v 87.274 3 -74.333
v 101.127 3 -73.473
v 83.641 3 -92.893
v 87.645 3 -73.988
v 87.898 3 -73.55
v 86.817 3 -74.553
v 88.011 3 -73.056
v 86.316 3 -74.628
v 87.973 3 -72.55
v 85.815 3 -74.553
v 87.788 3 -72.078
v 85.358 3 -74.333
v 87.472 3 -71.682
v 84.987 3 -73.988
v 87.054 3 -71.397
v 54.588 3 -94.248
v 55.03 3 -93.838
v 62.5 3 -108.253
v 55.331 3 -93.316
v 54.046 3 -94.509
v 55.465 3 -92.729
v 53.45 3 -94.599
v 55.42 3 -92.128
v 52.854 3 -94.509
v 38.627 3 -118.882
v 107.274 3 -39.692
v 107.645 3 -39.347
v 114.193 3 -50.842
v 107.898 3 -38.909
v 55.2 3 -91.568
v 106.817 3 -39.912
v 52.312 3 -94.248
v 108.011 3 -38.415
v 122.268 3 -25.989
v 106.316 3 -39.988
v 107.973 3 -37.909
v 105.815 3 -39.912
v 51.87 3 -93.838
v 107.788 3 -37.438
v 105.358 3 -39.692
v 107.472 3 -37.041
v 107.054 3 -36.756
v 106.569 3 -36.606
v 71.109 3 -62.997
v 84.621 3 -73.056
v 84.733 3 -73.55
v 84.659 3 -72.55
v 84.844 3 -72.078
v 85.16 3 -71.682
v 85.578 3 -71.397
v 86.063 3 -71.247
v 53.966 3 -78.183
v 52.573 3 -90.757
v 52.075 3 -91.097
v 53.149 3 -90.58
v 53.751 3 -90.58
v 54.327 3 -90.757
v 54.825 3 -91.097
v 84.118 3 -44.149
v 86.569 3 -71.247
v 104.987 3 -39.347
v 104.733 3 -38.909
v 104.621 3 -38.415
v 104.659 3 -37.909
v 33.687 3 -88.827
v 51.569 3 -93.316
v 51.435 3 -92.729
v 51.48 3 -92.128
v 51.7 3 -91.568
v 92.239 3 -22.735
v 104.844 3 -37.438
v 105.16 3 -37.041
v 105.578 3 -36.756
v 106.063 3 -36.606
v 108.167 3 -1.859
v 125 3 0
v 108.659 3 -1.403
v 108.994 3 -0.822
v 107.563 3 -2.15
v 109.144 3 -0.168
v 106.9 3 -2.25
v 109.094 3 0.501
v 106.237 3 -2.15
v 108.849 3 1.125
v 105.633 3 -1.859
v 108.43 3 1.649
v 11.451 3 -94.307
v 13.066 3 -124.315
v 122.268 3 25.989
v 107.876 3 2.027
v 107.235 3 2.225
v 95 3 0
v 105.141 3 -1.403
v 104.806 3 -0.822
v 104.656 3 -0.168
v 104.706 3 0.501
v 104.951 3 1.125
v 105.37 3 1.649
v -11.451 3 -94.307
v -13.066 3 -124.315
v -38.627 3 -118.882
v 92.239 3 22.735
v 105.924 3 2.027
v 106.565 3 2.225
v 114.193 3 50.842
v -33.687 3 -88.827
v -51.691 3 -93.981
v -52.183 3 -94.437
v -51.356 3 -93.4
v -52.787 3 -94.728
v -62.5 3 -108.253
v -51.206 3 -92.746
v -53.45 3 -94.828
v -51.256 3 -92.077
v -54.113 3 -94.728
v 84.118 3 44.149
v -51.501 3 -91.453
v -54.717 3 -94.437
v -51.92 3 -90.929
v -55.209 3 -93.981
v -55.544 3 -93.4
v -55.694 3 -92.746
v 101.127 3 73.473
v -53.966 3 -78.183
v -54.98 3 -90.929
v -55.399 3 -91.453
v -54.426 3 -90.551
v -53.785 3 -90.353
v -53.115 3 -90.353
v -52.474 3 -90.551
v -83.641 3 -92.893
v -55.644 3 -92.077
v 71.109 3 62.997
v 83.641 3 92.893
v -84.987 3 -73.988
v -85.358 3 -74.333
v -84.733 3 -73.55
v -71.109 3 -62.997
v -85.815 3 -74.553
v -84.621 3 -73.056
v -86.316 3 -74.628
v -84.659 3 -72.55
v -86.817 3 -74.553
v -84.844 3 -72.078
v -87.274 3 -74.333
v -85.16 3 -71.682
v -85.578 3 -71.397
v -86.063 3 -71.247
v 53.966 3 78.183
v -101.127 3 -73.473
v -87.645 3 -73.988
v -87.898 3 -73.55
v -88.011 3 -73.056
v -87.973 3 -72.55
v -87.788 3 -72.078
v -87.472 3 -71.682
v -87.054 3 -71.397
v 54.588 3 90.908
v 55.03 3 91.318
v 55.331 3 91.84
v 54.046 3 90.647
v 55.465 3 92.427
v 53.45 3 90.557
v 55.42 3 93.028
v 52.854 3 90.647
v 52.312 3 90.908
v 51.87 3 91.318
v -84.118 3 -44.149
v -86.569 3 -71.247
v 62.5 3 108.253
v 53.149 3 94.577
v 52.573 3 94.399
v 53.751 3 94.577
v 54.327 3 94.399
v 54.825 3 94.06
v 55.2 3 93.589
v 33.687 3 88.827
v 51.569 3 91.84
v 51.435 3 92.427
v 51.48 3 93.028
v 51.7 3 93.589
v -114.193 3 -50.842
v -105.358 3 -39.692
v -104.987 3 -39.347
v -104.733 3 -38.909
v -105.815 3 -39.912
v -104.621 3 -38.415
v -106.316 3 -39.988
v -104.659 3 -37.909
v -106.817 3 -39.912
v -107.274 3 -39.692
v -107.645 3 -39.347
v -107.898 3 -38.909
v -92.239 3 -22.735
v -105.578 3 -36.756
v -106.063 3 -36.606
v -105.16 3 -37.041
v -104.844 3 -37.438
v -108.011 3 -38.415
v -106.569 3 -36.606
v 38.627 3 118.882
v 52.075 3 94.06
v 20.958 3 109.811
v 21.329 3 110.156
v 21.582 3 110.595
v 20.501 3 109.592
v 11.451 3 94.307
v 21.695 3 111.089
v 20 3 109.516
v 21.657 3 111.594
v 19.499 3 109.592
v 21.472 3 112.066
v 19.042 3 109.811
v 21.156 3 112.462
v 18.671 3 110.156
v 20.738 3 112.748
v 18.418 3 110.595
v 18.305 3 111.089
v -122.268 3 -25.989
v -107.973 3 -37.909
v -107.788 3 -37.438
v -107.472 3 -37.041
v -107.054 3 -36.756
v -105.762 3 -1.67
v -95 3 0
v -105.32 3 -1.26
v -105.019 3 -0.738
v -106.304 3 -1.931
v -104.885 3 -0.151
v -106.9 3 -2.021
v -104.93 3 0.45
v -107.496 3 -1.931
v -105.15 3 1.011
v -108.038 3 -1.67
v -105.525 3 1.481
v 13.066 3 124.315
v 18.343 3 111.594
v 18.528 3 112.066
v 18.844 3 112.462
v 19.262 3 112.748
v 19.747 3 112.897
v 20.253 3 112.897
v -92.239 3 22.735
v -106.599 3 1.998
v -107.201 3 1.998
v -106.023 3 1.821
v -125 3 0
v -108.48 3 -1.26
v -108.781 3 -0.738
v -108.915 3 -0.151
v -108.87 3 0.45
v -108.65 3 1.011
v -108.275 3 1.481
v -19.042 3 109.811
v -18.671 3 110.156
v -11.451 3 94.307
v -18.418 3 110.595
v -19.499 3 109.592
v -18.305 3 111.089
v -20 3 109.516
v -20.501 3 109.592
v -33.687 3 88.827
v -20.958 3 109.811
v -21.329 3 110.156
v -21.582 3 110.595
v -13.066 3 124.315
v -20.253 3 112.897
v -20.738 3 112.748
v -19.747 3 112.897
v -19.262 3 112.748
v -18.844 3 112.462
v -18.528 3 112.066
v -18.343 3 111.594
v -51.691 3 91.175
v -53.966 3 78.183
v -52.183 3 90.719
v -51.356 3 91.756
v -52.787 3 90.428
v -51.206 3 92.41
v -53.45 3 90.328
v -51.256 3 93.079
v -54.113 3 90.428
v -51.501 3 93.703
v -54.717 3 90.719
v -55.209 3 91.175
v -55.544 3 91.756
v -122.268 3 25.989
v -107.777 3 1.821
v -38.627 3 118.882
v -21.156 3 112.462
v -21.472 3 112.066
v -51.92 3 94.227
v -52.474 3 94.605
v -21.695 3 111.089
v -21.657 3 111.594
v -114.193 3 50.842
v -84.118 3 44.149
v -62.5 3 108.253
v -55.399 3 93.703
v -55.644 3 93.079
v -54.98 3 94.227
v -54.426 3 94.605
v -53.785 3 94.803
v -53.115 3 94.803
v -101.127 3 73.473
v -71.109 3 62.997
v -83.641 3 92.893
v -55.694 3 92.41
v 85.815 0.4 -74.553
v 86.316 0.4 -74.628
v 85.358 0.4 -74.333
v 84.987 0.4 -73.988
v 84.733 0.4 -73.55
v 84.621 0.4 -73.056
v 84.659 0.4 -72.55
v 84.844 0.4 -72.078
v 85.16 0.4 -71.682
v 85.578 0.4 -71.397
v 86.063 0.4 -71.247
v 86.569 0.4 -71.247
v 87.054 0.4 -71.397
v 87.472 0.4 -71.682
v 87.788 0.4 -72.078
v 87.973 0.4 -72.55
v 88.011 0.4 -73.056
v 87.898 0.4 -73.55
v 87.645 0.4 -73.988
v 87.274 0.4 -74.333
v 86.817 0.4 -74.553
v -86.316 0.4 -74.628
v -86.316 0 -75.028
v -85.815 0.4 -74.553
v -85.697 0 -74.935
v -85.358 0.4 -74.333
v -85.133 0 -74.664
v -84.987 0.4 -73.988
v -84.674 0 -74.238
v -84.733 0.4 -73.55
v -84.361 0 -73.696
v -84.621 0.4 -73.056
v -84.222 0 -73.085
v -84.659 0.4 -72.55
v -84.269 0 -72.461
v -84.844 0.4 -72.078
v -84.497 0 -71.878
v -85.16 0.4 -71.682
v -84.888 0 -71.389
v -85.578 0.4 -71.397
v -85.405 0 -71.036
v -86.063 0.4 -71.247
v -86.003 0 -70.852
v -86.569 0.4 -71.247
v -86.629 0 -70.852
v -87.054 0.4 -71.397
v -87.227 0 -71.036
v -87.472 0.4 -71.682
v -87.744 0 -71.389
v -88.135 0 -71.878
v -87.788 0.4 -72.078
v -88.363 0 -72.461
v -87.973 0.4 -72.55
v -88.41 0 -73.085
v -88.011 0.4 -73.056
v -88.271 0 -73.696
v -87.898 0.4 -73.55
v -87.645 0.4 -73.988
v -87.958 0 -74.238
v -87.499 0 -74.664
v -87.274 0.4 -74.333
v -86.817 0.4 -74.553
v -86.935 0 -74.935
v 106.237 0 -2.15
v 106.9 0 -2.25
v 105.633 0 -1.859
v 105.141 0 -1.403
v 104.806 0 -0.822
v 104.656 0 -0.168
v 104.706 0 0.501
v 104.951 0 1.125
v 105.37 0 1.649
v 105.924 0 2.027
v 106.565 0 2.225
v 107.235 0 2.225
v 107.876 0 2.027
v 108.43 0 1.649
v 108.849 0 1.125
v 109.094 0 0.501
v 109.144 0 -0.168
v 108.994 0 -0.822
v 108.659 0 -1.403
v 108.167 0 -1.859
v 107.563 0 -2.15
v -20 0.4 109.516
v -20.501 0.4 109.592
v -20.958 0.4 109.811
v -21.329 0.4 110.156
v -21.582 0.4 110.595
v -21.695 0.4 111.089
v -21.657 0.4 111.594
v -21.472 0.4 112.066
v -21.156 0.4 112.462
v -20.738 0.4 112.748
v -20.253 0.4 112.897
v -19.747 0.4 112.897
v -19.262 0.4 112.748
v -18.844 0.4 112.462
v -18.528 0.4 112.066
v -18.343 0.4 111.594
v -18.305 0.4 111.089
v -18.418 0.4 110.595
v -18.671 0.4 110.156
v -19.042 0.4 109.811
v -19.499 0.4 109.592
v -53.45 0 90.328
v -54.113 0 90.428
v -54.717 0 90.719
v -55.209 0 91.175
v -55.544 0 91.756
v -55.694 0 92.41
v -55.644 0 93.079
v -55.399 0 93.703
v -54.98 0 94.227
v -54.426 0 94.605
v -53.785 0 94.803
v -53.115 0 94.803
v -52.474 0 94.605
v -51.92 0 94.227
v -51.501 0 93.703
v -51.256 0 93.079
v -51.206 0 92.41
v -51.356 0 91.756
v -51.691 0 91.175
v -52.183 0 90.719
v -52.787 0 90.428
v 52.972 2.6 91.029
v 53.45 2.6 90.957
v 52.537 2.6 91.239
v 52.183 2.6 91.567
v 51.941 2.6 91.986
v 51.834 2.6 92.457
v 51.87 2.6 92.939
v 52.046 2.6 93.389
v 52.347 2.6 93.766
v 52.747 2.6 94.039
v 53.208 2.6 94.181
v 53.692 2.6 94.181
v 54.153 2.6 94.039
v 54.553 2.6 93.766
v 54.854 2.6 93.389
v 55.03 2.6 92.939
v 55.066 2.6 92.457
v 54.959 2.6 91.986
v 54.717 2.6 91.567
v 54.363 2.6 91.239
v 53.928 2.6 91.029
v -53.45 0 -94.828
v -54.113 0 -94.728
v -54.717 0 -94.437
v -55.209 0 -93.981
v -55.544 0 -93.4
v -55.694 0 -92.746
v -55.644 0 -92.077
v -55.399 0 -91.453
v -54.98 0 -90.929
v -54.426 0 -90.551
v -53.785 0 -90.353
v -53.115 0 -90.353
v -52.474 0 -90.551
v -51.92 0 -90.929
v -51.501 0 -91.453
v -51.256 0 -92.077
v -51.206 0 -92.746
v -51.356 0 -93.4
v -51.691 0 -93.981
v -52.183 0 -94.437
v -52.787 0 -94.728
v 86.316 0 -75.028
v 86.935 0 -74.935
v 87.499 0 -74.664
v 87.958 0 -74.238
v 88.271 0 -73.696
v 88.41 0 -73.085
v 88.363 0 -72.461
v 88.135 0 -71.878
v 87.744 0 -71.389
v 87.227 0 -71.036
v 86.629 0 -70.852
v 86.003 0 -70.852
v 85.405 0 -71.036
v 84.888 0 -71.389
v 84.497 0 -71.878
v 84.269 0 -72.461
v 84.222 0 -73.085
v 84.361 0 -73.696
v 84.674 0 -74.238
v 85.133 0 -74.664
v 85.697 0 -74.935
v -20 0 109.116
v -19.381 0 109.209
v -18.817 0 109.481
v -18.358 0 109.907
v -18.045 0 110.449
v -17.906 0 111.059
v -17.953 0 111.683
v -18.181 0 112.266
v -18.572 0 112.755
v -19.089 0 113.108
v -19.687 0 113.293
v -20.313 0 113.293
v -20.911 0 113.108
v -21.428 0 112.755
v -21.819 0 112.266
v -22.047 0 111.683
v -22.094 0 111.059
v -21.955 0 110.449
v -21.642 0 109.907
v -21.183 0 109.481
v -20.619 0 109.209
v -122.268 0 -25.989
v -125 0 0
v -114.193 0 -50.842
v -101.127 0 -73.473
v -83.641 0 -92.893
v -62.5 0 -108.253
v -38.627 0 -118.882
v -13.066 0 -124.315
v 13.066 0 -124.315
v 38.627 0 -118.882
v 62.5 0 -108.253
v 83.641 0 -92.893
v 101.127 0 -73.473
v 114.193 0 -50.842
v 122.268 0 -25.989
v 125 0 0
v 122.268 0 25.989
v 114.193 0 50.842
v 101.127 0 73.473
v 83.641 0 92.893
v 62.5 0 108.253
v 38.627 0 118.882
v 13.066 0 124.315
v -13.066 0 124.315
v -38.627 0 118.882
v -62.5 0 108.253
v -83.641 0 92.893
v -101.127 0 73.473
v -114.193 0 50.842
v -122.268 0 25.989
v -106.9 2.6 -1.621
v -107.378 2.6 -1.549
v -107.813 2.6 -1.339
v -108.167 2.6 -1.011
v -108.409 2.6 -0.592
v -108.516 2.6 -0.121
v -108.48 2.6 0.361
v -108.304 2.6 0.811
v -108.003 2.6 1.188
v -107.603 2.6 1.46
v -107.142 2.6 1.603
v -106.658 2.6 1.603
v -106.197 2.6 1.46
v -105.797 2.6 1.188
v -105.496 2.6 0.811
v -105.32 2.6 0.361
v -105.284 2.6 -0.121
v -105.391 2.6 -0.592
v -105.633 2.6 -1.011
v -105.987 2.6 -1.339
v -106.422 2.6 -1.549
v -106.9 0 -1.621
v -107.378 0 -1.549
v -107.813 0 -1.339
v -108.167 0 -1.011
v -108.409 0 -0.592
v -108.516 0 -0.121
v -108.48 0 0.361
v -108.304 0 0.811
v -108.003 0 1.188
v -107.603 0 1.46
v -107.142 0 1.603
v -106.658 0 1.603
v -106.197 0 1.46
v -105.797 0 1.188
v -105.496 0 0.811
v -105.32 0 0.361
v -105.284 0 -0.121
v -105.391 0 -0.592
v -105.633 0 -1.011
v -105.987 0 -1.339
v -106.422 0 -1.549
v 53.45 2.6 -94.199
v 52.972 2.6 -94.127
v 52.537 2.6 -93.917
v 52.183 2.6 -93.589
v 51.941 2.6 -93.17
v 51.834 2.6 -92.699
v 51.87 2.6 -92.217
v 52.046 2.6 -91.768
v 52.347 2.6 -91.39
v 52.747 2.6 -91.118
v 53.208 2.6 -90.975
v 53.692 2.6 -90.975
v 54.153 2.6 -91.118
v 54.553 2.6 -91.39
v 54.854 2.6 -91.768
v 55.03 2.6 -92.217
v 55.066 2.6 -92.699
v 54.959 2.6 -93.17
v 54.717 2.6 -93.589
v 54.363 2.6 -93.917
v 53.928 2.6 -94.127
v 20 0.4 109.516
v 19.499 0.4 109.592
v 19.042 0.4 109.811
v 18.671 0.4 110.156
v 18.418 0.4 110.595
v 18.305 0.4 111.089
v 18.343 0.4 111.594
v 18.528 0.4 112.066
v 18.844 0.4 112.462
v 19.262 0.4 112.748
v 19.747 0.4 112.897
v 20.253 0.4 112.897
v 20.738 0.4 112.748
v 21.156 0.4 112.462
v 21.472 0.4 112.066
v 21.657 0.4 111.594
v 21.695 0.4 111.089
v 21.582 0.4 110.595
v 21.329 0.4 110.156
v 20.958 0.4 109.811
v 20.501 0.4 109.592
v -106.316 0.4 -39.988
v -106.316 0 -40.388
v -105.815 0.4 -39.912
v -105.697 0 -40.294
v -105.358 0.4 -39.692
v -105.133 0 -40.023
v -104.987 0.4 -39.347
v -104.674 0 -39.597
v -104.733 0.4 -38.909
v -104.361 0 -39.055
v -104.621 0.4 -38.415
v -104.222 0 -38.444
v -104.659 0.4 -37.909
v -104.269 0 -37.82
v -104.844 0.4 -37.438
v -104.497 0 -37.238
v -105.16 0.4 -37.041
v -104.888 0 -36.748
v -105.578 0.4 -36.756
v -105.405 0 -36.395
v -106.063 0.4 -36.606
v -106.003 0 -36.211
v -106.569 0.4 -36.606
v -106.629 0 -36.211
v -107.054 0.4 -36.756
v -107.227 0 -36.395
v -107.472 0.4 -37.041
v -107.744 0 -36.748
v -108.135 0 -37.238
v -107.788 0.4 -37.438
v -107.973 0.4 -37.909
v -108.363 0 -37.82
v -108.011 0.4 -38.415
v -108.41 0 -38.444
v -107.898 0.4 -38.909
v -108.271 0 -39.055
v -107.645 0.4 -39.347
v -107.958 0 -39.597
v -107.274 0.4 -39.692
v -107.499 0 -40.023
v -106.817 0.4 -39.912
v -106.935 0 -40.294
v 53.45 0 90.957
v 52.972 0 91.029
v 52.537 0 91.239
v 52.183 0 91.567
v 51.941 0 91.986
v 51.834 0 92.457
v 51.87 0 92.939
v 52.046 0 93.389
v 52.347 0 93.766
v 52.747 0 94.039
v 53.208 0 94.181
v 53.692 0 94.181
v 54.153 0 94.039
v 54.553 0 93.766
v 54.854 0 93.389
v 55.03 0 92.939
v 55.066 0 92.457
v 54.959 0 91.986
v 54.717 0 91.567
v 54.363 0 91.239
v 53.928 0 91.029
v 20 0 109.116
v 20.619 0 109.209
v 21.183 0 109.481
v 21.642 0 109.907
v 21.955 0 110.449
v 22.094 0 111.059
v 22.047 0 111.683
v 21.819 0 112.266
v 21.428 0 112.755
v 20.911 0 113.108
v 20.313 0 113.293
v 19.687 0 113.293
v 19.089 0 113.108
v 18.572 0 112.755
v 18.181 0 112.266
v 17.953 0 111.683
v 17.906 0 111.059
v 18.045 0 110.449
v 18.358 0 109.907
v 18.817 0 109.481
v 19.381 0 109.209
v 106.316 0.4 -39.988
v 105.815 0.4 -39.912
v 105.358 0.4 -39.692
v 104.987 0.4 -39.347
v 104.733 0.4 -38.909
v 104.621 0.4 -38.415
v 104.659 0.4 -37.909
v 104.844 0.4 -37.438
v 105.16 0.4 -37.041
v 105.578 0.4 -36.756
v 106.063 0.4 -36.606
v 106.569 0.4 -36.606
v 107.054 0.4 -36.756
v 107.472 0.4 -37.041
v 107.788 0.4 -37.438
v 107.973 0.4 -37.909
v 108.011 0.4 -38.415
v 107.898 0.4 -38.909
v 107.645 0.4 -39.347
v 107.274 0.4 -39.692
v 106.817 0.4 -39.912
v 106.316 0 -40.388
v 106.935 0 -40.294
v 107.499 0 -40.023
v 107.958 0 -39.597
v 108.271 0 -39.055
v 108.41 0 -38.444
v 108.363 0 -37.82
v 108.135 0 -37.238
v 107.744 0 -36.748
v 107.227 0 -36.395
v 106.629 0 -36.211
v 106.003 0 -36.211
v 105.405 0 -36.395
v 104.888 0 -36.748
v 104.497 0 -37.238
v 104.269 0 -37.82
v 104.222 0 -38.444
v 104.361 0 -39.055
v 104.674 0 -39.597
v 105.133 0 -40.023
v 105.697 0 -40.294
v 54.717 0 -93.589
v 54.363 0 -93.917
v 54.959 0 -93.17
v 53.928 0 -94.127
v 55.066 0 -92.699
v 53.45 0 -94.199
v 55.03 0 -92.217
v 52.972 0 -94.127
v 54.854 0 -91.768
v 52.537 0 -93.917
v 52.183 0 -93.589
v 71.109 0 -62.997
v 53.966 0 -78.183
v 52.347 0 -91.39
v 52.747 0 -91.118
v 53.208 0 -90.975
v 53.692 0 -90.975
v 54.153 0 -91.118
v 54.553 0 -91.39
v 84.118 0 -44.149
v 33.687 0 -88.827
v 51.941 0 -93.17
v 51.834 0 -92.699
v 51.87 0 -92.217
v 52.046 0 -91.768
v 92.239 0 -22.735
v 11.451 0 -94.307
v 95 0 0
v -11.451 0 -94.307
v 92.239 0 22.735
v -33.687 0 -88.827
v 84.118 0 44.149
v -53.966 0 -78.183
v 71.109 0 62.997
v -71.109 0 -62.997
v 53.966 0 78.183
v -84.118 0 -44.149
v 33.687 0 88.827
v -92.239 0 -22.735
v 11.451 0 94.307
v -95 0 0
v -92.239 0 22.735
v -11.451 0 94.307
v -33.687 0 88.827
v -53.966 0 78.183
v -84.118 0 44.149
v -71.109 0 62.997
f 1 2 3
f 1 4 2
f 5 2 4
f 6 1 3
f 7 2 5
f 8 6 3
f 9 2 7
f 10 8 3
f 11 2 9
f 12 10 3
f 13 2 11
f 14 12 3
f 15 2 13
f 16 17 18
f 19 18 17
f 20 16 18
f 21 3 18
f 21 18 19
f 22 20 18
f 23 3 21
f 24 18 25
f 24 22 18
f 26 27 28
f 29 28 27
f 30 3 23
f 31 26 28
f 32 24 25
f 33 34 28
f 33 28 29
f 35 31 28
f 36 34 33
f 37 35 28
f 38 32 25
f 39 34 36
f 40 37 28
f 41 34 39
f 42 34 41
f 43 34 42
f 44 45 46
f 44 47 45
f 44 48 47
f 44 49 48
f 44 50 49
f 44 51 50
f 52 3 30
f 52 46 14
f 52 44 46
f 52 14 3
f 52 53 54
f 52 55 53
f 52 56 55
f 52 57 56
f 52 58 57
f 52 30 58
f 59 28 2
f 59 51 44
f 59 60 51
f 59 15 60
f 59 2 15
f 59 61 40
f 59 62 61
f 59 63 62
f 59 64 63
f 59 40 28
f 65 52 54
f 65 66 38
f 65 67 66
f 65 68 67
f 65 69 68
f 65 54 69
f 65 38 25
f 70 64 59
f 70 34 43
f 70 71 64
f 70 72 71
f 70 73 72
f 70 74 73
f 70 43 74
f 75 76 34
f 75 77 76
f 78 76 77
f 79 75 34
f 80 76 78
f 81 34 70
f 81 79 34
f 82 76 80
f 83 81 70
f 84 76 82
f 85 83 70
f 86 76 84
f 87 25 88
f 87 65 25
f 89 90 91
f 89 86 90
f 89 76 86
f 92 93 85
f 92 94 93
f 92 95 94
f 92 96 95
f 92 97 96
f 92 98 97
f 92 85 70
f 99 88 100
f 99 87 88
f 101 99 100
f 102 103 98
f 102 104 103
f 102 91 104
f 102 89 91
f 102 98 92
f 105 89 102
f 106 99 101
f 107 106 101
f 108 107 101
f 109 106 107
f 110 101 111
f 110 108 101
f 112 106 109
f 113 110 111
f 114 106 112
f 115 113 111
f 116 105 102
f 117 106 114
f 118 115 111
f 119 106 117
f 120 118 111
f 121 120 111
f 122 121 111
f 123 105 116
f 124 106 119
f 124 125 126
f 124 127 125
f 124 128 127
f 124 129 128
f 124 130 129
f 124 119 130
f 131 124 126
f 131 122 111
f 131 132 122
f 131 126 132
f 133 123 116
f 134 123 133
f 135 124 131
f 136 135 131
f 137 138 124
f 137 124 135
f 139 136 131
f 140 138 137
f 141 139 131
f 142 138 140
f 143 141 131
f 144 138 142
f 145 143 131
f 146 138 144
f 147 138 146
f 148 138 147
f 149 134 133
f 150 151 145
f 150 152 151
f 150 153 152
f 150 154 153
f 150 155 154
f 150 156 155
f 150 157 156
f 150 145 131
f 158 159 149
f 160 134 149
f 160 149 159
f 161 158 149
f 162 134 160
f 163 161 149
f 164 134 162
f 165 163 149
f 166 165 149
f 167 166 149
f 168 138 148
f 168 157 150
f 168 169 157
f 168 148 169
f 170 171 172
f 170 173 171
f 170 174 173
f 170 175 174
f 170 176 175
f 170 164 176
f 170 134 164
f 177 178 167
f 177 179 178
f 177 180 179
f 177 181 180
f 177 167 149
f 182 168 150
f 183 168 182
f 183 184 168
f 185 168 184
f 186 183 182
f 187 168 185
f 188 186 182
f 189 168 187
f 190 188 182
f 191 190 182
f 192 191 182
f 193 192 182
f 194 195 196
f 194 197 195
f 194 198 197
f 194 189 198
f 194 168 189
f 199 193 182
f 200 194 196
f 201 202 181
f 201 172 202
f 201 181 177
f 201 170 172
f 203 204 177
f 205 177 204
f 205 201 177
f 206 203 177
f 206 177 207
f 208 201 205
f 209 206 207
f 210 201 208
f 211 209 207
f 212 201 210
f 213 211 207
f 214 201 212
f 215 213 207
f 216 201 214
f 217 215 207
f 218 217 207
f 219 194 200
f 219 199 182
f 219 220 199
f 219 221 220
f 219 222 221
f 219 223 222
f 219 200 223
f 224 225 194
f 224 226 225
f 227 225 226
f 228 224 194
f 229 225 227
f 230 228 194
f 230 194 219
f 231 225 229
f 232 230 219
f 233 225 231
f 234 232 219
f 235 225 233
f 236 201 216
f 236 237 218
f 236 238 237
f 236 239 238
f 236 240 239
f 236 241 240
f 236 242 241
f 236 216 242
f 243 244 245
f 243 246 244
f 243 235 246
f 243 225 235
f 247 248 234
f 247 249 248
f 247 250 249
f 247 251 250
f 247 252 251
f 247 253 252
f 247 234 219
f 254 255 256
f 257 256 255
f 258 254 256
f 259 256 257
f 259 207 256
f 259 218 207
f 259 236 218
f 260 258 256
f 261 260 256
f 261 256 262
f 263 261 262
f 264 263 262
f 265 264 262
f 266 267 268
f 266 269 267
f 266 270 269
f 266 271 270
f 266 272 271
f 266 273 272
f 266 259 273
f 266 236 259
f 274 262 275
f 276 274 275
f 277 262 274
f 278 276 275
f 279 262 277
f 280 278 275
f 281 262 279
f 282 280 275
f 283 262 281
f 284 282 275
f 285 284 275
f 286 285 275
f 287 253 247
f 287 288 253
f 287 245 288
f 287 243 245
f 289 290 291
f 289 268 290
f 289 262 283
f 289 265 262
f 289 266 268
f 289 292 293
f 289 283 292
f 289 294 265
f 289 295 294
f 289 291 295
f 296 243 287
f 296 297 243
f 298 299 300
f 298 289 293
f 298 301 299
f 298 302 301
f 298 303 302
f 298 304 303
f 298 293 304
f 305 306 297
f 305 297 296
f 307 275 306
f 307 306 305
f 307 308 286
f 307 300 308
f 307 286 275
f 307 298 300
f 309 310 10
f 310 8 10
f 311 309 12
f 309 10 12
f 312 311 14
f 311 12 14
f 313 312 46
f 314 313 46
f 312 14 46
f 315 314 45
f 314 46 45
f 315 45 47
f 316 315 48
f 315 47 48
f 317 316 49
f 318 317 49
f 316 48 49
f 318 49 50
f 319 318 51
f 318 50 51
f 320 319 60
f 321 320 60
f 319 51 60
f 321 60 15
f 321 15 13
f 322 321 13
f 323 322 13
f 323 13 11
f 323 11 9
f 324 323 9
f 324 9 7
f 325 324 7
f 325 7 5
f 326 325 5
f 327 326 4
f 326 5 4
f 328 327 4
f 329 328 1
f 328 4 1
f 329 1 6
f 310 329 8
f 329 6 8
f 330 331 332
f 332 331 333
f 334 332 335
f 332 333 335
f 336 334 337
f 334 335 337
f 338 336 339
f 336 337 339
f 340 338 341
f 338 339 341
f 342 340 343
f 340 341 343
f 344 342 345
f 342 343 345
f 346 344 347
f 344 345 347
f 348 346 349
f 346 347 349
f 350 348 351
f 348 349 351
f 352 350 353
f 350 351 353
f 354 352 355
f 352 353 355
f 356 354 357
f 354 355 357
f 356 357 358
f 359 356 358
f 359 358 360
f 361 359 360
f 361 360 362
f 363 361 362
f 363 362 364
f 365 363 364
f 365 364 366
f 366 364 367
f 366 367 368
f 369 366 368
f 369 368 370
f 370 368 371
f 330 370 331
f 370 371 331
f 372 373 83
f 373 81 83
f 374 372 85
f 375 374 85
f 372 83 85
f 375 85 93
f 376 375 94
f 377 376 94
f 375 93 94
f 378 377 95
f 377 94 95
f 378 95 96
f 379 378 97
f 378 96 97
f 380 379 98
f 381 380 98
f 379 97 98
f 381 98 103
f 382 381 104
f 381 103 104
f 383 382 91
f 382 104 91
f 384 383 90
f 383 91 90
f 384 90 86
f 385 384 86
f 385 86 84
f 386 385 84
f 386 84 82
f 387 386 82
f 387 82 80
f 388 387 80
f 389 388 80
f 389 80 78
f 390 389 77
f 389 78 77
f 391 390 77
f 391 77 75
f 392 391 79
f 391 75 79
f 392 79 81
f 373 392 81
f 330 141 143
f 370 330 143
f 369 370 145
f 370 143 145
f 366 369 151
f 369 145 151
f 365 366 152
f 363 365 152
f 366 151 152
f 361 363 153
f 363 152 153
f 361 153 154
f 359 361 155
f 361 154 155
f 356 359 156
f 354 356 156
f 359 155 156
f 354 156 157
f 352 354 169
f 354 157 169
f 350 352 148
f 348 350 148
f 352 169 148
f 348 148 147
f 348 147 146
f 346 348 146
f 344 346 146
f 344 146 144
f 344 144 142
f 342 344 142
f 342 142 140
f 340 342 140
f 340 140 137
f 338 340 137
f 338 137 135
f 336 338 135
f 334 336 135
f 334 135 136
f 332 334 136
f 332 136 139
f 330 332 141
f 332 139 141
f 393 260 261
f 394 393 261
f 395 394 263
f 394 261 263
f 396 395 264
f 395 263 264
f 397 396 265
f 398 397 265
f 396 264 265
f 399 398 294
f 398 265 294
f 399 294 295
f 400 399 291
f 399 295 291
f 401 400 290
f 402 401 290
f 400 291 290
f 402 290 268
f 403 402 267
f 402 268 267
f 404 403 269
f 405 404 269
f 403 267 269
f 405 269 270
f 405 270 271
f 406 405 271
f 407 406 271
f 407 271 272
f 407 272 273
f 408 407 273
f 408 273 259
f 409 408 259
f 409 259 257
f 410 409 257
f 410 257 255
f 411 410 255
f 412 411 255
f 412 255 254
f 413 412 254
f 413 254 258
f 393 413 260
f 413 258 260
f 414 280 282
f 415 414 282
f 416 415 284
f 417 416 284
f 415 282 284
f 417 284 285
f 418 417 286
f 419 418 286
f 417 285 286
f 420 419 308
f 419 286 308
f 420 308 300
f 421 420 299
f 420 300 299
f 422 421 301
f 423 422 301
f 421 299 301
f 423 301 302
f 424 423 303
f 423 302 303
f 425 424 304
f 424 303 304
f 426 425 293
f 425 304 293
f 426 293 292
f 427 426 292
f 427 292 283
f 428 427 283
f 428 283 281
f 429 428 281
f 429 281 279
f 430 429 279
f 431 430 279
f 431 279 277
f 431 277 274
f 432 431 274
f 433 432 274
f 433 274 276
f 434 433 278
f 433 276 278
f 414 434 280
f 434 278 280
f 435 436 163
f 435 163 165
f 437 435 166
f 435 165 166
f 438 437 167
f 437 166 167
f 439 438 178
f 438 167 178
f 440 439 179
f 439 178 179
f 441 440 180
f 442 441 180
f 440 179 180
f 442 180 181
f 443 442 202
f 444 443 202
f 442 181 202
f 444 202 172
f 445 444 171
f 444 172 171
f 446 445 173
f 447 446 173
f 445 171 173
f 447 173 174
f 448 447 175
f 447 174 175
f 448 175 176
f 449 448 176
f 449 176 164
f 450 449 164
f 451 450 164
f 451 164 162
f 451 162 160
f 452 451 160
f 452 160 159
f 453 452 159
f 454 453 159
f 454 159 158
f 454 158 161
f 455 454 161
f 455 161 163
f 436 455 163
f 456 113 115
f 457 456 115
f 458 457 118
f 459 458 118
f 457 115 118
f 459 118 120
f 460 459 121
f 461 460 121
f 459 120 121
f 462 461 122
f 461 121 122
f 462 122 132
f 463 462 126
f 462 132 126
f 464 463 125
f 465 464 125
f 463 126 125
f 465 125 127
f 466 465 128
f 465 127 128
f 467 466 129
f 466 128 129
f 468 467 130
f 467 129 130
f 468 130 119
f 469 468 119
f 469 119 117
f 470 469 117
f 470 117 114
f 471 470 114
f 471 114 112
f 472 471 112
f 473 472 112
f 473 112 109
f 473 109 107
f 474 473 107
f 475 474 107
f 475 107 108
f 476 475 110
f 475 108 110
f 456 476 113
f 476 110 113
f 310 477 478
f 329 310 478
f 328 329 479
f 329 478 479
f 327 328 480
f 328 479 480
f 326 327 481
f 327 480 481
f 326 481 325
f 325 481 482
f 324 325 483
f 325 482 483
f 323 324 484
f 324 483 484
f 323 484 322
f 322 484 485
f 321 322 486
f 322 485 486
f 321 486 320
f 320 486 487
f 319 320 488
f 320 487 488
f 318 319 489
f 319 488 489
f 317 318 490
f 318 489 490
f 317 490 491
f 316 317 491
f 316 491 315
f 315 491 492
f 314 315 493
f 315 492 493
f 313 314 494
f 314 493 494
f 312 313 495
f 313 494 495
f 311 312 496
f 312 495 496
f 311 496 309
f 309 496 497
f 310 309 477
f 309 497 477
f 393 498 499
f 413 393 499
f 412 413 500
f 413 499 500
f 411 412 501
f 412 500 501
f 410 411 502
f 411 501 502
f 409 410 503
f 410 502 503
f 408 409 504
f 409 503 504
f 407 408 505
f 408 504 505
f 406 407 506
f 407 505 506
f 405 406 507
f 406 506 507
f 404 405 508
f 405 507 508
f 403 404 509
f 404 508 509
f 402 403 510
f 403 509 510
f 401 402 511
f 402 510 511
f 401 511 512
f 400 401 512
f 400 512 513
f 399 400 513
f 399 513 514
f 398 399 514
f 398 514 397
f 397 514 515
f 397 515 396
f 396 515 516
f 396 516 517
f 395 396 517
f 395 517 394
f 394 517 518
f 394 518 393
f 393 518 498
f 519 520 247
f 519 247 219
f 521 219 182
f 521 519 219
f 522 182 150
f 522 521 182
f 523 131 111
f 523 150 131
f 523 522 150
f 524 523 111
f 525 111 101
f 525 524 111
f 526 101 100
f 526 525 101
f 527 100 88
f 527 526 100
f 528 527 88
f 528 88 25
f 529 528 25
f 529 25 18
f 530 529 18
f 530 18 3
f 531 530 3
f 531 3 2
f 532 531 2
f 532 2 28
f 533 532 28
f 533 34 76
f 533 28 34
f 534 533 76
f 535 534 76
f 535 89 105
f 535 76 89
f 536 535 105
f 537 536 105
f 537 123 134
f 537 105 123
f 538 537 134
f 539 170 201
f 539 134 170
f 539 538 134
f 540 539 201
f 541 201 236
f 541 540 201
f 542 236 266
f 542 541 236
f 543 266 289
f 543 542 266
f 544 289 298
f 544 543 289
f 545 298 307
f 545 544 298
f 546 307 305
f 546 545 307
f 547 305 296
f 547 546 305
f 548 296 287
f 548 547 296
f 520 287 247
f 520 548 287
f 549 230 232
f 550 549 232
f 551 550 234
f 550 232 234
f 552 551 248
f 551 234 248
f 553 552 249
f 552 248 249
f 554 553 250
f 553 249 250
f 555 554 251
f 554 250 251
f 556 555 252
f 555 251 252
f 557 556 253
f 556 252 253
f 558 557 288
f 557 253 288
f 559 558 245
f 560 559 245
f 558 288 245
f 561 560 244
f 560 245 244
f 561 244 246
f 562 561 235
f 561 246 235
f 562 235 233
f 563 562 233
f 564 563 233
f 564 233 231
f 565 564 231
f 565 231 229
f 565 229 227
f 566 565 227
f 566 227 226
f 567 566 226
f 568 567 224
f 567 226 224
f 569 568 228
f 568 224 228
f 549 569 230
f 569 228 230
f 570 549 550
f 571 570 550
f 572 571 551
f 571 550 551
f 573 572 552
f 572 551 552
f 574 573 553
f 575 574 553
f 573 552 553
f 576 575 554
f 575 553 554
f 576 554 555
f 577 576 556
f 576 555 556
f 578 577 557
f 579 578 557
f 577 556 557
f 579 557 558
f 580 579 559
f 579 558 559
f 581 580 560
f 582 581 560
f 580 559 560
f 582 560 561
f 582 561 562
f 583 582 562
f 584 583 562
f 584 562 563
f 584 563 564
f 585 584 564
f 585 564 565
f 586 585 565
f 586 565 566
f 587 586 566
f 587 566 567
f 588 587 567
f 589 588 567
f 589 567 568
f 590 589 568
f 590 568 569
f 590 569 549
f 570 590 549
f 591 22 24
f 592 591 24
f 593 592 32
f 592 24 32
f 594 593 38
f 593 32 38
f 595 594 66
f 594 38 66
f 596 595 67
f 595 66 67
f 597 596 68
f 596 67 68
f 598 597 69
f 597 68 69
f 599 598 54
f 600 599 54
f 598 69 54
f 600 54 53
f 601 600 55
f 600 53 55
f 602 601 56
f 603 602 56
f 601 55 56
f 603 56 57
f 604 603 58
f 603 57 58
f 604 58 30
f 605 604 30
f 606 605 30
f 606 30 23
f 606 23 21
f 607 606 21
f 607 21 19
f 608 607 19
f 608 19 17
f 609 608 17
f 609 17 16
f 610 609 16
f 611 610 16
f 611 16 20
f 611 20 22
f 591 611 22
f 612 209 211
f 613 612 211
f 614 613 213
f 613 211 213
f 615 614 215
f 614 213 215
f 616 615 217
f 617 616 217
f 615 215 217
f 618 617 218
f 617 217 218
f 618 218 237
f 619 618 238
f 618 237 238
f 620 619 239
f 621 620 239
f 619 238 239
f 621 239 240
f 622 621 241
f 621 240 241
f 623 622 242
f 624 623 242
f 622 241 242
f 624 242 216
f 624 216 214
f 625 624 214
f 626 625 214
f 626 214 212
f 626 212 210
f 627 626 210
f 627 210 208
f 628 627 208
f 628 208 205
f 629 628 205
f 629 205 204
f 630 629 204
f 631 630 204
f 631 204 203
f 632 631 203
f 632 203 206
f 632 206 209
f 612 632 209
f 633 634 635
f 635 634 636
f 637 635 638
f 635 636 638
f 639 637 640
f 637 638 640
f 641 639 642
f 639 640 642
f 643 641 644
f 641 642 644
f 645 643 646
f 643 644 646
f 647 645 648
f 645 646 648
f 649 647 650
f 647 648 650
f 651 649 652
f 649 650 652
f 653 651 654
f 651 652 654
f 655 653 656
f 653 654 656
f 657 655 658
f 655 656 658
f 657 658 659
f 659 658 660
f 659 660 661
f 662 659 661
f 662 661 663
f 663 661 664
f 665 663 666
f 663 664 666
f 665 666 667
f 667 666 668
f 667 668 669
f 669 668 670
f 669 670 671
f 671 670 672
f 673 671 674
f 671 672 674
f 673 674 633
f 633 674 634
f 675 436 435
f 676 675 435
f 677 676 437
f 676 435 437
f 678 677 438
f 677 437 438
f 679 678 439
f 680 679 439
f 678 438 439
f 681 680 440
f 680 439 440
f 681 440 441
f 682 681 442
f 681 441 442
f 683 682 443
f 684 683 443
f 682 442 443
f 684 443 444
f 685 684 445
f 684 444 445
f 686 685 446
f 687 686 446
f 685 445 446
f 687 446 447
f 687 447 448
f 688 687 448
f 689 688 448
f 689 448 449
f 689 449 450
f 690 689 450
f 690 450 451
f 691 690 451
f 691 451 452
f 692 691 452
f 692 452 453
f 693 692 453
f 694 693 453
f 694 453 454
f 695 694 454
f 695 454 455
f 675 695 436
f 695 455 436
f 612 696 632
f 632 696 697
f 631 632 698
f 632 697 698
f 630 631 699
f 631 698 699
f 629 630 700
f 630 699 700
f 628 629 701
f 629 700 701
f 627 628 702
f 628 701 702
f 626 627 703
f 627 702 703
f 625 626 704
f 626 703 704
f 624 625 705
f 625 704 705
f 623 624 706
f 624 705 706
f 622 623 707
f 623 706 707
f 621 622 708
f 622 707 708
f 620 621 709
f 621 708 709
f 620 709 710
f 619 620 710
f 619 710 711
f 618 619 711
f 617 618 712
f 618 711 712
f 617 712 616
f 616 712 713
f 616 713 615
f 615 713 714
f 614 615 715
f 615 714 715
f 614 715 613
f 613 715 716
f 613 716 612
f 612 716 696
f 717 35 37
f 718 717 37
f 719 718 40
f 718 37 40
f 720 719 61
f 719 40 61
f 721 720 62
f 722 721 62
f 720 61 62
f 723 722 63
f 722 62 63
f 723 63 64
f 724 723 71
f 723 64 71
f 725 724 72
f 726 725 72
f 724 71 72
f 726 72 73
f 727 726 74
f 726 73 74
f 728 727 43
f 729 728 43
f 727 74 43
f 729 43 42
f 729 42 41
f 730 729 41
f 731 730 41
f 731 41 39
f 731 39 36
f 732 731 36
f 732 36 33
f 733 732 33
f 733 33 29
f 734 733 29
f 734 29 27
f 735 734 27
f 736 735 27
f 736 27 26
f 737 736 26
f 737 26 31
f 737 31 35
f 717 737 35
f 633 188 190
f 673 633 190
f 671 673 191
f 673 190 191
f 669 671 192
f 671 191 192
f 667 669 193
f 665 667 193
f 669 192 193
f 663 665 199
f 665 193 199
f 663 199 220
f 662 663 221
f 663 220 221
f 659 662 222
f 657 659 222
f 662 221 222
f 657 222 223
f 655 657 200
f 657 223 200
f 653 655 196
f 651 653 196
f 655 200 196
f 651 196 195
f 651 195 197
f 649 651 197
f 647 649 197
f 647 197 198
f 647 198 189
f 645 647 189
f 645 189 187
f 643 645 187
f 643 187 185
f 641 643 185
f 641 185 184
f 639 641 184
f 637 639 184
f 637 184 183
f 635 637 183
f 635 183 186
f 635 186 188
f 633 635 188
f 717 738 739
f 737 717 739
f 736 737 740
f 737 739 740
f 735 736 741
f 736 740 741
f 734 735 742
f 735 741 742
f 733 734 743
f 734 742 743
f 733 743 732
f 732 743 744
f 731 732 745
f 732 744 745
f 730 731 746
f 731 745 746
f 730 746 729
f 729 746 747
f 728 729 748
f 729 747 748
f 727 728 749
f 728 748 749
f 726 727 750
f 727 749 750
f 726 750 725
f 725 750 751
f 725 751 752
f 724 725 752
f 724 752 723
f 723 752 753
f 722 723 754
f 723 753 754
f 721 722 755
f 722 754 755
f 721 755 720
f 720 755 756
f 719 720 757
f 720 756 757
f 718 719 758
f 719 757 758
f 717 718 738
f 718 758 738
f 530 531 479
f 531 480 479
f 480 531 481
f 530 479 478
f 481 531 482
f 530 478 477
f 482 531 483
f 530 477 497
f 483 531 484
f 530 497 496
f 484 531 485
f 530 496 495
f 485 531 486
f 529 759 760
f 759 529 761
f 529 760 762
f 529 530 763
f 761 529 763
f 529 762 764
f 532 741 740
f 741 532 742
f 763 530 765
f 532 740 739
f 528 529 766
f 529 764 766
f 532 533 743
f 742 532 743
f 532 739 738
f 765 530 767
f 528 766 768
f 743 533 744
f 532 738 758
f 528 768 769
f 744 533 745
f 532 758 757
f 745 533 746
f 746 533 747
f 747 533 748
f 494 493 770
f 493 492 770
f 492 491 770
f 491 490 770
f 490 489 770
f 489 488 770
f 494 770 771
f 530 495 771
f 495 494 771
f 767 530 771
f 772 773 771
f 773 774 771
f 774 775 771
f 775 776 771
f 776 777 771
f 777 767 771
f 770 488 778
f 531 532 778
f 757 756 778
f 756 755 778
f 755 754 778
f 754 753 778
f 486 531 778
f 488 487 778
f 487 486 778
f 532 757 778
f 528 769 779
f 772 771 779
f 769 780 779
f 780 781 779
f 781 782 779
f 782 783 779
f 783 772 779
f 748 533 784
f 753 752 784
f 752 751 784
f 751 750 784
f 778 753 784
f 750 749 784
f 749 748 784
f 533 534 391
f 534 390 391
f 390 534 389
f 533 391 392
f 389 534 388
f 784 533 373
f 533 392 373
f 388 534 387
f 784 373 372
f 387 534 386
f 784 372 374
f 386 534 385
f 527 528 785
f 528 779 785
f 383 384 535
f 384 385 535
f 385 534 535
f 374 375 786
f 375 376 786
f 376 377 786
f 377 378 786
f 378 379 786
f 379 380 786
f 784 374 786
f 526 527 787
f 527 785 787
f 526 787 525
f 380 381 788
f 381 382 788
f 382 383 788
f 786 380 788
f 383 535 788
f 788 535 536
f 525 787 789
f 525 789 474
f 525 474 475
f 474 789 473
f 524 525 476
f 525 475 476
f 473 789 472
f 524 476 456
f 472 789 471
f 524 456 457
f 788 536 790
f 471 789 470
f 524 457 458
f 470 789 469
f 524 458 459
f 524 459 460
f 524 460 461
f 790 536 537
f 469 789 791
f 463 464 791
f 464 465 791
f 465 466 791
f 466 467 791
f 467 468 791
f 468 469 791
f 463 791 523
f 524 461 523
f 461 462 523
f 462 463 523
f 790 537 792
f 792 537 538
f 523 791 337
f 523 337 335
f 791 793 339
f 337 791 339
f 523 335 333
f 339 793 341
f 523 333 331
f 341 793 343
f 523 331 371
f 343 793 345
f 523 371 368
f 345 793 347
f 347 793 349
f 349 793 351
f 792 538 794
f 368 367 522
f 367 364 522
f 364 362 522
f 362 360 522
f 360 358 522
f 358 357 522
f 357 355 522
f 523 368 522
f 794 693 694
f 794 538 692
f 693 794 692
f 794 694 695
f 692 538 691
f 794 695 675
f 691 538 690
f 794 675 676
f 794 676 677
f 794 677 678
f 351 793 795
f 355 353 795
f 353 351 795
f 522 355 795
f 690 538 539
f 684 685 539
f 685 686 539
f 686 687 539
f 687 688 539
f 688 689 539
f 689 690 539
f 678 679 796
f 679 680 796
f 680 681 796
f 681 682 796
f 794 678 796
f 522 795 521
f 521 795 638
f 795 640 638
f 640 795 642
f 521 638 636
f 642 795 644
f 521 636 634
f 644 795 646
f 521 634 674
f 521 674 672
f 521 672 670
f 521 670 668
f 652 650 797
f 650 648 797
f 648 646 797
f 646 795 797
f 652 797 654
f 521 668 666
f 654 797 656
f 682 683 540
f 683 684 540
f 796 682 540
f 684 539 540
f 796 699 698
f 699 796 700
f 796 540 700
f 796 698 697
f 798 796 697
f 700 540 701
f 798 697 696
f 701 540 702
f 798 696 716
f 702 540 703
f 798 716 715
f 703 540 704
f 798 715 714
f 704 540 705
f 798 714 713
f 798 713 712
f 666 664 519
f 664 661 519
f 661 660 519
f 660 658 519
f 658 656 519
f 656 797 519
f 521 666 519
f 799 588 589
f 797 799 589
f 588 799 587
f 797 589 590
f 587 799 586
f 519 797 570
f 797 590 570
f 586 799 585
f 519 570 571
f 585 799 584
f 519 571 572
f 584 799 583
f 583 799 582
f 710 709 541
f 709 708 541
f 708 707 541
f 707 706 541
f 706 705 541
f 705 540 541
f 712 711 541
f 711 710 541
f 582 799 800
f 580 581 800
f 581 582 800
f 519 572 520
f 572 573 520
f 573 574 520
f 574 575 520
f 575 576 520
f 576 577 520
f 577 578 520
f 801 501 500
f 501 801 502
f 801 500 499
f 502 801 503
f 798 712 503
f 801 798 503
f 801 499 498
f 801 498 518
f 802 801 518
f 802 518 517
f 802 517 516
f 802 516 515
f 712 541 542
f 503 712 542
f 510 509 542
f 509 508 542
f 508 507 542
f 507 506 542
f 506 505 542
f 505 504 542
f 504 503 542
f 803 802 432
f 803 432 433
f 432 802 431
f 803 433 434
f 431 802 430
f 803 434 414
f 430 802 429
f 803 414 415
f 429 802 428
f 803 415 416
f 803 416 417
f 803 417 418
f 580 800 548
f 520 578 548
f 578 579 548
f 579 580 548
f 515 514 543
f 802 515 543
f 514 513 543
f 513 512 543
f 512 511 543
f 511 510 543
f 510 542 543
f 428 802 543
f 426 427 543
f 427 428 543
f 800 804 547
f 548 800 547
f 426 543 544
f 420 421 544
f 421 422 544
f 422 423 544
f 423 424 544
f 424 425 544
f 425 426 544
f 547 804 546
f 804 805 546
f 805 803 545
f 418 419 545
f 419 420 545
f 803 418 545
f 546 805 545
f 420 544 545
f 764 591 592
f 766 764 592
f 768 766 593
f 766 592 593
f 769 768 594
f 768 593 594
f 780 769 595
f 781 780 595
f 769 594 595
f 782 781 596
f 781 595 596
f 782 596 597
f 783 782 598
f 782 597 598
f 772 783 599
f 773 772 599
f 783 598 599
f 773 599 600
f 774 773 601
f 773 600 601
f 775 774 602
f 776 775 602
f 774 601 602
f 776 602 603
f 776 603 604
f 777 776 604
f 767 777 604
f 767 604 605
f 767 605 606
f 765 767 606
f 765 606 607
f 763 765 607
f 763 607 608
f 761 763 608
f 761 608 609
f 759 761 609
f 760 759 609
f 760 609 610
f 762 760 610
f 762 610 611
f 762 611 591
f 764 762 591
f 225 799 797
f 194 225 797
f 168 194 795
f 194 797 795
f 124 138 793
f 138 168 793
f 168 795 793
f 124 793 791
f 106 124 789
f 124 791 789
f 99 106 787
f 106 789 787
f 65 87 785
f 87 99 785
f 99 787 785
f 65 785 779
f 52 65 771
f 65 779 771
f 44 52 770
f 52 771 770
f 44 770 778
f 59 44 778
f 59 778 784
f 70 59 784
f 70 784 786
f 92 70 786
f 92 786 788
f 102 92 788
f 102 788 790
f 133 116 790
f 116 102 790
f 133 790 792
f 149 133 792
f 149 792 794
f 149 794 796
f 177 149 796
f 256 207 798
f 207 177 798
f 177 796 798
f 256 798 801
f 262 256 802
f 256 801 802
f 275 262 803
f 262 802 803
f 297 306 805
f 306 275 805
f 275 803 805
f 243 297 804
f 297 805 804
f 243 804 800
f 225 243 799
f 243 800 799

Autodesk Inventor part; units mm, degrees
ref_plane "YZ Plane" through (0, 0, 0) normal (1, 0, 0) x (0, 1, 0)
ref_plane "XZ Plane" through (0, 0, 0) normal (0, 1, 0) x (-1, 0, 0)
ref_plane "XY Plane" through (0, 0, 0) normal (0, 0, 1) x (1, 0, 0)
sketch "Szkic3" plane through (0, 0, 0) normal (0, 1, 0) x (-1, 0, 0)
  circle A0 centre (0, 0) radius 125
  circle A1 centre (0, 0) radius 95
  dimension "d14" = 190
extrude "Wyciągnięcie proste3" add sketch "Szkic3" along normal blind 3
sketch "Szkic4" plane through (0, 0, 0) normal (0, -1, 0) x (1, 0, 0)
  circle A0 centre (0, 0) radius 113
  line L0 (0, 0) -> (0, 141.0619)
  point P0 (20, 111.216)
  point P1 (-20, 111.216)
  point P2 (-106.3159, -38.2875)
  point P3 (-86.3159, -72.9285)
  point P4 (86.3159, -72.9285)
  point P5 (106.3159, -38.2875)
  dimension "d23" = 226
  dimension "d24" = 20
  dimension "d25" = 20
  dimension "d96" = 360
sketch "Szkic7" plane through (0, 0, 0) normal (0, -1, 0) x (1, 0, 0)
  circle A0 centre (0, 0) radius 106.9
  point P0 (106.9, 0)
  point P1 (-53.45, 92.5781)
  point P2 (-53.45, -92.5781)
  dimension "d69" = 213.8
  dimension "d72" = 360
hole "Otwór2" at (106.9, 0, 0) at (-53.45, 0, 92.5781) at (-53.45, 0, -92.5781) direction (0, 1, 0) diameter 4.5 end through all clearance for "Śruba ze łbem stożkowym ISO 2009/7046" size "M4" standard "ISO"
sketch "Szkic9" plane through (0, 0, 0) normal (0, -1, 0) x (1, 0, 0)
  point P0 (0, 0)
  point P1 (53.45, -92.5781)
  point P2 (53.45, 92.5781)
  point P3 (-106.9, 0)
  dimension "d85" = 360
hole "Otwór3" at (53.45, 0, -92.5781) at (53.45, 0, 92.5781) at (-106.9, 0, 0) direction (0, 1, 0) diameter 3.242 end through all thread size "M4x0.7" class "6H" standard "ISO Metric profile"
hole "Otwór4" at (20, 0, 111.216) at (-20, 0, 111.216) at (-106.3159, 0, -38.2875) at (-86.3159, 0, -72.9285) at (86.3159, 0, -72.9285) at (106.3159, 0, -38.2875) direction (0, 1, 0) diameter 3.4 end through all clearance for "Śruba ze łbem stożkowym ISO 2009/7046" size "M3" standard "ISO"
chamfer "Faza1" distance 0.4 angle 45 9 edges at (86.3159, 0, -71.2285) (106.3159, 0, -36.5875) (-86.3159, 0, -71.2285) (-106.3159, 0, -36.5875) (20, 0, 112.916) (-20, 0, 112.916) (53.45, 3, -90.9571) (-106.9, 3, 1.621) (53.45, 3, 94.1991)
properties part number "RingPrimaryMirror" material "Stal nierdzewna"
